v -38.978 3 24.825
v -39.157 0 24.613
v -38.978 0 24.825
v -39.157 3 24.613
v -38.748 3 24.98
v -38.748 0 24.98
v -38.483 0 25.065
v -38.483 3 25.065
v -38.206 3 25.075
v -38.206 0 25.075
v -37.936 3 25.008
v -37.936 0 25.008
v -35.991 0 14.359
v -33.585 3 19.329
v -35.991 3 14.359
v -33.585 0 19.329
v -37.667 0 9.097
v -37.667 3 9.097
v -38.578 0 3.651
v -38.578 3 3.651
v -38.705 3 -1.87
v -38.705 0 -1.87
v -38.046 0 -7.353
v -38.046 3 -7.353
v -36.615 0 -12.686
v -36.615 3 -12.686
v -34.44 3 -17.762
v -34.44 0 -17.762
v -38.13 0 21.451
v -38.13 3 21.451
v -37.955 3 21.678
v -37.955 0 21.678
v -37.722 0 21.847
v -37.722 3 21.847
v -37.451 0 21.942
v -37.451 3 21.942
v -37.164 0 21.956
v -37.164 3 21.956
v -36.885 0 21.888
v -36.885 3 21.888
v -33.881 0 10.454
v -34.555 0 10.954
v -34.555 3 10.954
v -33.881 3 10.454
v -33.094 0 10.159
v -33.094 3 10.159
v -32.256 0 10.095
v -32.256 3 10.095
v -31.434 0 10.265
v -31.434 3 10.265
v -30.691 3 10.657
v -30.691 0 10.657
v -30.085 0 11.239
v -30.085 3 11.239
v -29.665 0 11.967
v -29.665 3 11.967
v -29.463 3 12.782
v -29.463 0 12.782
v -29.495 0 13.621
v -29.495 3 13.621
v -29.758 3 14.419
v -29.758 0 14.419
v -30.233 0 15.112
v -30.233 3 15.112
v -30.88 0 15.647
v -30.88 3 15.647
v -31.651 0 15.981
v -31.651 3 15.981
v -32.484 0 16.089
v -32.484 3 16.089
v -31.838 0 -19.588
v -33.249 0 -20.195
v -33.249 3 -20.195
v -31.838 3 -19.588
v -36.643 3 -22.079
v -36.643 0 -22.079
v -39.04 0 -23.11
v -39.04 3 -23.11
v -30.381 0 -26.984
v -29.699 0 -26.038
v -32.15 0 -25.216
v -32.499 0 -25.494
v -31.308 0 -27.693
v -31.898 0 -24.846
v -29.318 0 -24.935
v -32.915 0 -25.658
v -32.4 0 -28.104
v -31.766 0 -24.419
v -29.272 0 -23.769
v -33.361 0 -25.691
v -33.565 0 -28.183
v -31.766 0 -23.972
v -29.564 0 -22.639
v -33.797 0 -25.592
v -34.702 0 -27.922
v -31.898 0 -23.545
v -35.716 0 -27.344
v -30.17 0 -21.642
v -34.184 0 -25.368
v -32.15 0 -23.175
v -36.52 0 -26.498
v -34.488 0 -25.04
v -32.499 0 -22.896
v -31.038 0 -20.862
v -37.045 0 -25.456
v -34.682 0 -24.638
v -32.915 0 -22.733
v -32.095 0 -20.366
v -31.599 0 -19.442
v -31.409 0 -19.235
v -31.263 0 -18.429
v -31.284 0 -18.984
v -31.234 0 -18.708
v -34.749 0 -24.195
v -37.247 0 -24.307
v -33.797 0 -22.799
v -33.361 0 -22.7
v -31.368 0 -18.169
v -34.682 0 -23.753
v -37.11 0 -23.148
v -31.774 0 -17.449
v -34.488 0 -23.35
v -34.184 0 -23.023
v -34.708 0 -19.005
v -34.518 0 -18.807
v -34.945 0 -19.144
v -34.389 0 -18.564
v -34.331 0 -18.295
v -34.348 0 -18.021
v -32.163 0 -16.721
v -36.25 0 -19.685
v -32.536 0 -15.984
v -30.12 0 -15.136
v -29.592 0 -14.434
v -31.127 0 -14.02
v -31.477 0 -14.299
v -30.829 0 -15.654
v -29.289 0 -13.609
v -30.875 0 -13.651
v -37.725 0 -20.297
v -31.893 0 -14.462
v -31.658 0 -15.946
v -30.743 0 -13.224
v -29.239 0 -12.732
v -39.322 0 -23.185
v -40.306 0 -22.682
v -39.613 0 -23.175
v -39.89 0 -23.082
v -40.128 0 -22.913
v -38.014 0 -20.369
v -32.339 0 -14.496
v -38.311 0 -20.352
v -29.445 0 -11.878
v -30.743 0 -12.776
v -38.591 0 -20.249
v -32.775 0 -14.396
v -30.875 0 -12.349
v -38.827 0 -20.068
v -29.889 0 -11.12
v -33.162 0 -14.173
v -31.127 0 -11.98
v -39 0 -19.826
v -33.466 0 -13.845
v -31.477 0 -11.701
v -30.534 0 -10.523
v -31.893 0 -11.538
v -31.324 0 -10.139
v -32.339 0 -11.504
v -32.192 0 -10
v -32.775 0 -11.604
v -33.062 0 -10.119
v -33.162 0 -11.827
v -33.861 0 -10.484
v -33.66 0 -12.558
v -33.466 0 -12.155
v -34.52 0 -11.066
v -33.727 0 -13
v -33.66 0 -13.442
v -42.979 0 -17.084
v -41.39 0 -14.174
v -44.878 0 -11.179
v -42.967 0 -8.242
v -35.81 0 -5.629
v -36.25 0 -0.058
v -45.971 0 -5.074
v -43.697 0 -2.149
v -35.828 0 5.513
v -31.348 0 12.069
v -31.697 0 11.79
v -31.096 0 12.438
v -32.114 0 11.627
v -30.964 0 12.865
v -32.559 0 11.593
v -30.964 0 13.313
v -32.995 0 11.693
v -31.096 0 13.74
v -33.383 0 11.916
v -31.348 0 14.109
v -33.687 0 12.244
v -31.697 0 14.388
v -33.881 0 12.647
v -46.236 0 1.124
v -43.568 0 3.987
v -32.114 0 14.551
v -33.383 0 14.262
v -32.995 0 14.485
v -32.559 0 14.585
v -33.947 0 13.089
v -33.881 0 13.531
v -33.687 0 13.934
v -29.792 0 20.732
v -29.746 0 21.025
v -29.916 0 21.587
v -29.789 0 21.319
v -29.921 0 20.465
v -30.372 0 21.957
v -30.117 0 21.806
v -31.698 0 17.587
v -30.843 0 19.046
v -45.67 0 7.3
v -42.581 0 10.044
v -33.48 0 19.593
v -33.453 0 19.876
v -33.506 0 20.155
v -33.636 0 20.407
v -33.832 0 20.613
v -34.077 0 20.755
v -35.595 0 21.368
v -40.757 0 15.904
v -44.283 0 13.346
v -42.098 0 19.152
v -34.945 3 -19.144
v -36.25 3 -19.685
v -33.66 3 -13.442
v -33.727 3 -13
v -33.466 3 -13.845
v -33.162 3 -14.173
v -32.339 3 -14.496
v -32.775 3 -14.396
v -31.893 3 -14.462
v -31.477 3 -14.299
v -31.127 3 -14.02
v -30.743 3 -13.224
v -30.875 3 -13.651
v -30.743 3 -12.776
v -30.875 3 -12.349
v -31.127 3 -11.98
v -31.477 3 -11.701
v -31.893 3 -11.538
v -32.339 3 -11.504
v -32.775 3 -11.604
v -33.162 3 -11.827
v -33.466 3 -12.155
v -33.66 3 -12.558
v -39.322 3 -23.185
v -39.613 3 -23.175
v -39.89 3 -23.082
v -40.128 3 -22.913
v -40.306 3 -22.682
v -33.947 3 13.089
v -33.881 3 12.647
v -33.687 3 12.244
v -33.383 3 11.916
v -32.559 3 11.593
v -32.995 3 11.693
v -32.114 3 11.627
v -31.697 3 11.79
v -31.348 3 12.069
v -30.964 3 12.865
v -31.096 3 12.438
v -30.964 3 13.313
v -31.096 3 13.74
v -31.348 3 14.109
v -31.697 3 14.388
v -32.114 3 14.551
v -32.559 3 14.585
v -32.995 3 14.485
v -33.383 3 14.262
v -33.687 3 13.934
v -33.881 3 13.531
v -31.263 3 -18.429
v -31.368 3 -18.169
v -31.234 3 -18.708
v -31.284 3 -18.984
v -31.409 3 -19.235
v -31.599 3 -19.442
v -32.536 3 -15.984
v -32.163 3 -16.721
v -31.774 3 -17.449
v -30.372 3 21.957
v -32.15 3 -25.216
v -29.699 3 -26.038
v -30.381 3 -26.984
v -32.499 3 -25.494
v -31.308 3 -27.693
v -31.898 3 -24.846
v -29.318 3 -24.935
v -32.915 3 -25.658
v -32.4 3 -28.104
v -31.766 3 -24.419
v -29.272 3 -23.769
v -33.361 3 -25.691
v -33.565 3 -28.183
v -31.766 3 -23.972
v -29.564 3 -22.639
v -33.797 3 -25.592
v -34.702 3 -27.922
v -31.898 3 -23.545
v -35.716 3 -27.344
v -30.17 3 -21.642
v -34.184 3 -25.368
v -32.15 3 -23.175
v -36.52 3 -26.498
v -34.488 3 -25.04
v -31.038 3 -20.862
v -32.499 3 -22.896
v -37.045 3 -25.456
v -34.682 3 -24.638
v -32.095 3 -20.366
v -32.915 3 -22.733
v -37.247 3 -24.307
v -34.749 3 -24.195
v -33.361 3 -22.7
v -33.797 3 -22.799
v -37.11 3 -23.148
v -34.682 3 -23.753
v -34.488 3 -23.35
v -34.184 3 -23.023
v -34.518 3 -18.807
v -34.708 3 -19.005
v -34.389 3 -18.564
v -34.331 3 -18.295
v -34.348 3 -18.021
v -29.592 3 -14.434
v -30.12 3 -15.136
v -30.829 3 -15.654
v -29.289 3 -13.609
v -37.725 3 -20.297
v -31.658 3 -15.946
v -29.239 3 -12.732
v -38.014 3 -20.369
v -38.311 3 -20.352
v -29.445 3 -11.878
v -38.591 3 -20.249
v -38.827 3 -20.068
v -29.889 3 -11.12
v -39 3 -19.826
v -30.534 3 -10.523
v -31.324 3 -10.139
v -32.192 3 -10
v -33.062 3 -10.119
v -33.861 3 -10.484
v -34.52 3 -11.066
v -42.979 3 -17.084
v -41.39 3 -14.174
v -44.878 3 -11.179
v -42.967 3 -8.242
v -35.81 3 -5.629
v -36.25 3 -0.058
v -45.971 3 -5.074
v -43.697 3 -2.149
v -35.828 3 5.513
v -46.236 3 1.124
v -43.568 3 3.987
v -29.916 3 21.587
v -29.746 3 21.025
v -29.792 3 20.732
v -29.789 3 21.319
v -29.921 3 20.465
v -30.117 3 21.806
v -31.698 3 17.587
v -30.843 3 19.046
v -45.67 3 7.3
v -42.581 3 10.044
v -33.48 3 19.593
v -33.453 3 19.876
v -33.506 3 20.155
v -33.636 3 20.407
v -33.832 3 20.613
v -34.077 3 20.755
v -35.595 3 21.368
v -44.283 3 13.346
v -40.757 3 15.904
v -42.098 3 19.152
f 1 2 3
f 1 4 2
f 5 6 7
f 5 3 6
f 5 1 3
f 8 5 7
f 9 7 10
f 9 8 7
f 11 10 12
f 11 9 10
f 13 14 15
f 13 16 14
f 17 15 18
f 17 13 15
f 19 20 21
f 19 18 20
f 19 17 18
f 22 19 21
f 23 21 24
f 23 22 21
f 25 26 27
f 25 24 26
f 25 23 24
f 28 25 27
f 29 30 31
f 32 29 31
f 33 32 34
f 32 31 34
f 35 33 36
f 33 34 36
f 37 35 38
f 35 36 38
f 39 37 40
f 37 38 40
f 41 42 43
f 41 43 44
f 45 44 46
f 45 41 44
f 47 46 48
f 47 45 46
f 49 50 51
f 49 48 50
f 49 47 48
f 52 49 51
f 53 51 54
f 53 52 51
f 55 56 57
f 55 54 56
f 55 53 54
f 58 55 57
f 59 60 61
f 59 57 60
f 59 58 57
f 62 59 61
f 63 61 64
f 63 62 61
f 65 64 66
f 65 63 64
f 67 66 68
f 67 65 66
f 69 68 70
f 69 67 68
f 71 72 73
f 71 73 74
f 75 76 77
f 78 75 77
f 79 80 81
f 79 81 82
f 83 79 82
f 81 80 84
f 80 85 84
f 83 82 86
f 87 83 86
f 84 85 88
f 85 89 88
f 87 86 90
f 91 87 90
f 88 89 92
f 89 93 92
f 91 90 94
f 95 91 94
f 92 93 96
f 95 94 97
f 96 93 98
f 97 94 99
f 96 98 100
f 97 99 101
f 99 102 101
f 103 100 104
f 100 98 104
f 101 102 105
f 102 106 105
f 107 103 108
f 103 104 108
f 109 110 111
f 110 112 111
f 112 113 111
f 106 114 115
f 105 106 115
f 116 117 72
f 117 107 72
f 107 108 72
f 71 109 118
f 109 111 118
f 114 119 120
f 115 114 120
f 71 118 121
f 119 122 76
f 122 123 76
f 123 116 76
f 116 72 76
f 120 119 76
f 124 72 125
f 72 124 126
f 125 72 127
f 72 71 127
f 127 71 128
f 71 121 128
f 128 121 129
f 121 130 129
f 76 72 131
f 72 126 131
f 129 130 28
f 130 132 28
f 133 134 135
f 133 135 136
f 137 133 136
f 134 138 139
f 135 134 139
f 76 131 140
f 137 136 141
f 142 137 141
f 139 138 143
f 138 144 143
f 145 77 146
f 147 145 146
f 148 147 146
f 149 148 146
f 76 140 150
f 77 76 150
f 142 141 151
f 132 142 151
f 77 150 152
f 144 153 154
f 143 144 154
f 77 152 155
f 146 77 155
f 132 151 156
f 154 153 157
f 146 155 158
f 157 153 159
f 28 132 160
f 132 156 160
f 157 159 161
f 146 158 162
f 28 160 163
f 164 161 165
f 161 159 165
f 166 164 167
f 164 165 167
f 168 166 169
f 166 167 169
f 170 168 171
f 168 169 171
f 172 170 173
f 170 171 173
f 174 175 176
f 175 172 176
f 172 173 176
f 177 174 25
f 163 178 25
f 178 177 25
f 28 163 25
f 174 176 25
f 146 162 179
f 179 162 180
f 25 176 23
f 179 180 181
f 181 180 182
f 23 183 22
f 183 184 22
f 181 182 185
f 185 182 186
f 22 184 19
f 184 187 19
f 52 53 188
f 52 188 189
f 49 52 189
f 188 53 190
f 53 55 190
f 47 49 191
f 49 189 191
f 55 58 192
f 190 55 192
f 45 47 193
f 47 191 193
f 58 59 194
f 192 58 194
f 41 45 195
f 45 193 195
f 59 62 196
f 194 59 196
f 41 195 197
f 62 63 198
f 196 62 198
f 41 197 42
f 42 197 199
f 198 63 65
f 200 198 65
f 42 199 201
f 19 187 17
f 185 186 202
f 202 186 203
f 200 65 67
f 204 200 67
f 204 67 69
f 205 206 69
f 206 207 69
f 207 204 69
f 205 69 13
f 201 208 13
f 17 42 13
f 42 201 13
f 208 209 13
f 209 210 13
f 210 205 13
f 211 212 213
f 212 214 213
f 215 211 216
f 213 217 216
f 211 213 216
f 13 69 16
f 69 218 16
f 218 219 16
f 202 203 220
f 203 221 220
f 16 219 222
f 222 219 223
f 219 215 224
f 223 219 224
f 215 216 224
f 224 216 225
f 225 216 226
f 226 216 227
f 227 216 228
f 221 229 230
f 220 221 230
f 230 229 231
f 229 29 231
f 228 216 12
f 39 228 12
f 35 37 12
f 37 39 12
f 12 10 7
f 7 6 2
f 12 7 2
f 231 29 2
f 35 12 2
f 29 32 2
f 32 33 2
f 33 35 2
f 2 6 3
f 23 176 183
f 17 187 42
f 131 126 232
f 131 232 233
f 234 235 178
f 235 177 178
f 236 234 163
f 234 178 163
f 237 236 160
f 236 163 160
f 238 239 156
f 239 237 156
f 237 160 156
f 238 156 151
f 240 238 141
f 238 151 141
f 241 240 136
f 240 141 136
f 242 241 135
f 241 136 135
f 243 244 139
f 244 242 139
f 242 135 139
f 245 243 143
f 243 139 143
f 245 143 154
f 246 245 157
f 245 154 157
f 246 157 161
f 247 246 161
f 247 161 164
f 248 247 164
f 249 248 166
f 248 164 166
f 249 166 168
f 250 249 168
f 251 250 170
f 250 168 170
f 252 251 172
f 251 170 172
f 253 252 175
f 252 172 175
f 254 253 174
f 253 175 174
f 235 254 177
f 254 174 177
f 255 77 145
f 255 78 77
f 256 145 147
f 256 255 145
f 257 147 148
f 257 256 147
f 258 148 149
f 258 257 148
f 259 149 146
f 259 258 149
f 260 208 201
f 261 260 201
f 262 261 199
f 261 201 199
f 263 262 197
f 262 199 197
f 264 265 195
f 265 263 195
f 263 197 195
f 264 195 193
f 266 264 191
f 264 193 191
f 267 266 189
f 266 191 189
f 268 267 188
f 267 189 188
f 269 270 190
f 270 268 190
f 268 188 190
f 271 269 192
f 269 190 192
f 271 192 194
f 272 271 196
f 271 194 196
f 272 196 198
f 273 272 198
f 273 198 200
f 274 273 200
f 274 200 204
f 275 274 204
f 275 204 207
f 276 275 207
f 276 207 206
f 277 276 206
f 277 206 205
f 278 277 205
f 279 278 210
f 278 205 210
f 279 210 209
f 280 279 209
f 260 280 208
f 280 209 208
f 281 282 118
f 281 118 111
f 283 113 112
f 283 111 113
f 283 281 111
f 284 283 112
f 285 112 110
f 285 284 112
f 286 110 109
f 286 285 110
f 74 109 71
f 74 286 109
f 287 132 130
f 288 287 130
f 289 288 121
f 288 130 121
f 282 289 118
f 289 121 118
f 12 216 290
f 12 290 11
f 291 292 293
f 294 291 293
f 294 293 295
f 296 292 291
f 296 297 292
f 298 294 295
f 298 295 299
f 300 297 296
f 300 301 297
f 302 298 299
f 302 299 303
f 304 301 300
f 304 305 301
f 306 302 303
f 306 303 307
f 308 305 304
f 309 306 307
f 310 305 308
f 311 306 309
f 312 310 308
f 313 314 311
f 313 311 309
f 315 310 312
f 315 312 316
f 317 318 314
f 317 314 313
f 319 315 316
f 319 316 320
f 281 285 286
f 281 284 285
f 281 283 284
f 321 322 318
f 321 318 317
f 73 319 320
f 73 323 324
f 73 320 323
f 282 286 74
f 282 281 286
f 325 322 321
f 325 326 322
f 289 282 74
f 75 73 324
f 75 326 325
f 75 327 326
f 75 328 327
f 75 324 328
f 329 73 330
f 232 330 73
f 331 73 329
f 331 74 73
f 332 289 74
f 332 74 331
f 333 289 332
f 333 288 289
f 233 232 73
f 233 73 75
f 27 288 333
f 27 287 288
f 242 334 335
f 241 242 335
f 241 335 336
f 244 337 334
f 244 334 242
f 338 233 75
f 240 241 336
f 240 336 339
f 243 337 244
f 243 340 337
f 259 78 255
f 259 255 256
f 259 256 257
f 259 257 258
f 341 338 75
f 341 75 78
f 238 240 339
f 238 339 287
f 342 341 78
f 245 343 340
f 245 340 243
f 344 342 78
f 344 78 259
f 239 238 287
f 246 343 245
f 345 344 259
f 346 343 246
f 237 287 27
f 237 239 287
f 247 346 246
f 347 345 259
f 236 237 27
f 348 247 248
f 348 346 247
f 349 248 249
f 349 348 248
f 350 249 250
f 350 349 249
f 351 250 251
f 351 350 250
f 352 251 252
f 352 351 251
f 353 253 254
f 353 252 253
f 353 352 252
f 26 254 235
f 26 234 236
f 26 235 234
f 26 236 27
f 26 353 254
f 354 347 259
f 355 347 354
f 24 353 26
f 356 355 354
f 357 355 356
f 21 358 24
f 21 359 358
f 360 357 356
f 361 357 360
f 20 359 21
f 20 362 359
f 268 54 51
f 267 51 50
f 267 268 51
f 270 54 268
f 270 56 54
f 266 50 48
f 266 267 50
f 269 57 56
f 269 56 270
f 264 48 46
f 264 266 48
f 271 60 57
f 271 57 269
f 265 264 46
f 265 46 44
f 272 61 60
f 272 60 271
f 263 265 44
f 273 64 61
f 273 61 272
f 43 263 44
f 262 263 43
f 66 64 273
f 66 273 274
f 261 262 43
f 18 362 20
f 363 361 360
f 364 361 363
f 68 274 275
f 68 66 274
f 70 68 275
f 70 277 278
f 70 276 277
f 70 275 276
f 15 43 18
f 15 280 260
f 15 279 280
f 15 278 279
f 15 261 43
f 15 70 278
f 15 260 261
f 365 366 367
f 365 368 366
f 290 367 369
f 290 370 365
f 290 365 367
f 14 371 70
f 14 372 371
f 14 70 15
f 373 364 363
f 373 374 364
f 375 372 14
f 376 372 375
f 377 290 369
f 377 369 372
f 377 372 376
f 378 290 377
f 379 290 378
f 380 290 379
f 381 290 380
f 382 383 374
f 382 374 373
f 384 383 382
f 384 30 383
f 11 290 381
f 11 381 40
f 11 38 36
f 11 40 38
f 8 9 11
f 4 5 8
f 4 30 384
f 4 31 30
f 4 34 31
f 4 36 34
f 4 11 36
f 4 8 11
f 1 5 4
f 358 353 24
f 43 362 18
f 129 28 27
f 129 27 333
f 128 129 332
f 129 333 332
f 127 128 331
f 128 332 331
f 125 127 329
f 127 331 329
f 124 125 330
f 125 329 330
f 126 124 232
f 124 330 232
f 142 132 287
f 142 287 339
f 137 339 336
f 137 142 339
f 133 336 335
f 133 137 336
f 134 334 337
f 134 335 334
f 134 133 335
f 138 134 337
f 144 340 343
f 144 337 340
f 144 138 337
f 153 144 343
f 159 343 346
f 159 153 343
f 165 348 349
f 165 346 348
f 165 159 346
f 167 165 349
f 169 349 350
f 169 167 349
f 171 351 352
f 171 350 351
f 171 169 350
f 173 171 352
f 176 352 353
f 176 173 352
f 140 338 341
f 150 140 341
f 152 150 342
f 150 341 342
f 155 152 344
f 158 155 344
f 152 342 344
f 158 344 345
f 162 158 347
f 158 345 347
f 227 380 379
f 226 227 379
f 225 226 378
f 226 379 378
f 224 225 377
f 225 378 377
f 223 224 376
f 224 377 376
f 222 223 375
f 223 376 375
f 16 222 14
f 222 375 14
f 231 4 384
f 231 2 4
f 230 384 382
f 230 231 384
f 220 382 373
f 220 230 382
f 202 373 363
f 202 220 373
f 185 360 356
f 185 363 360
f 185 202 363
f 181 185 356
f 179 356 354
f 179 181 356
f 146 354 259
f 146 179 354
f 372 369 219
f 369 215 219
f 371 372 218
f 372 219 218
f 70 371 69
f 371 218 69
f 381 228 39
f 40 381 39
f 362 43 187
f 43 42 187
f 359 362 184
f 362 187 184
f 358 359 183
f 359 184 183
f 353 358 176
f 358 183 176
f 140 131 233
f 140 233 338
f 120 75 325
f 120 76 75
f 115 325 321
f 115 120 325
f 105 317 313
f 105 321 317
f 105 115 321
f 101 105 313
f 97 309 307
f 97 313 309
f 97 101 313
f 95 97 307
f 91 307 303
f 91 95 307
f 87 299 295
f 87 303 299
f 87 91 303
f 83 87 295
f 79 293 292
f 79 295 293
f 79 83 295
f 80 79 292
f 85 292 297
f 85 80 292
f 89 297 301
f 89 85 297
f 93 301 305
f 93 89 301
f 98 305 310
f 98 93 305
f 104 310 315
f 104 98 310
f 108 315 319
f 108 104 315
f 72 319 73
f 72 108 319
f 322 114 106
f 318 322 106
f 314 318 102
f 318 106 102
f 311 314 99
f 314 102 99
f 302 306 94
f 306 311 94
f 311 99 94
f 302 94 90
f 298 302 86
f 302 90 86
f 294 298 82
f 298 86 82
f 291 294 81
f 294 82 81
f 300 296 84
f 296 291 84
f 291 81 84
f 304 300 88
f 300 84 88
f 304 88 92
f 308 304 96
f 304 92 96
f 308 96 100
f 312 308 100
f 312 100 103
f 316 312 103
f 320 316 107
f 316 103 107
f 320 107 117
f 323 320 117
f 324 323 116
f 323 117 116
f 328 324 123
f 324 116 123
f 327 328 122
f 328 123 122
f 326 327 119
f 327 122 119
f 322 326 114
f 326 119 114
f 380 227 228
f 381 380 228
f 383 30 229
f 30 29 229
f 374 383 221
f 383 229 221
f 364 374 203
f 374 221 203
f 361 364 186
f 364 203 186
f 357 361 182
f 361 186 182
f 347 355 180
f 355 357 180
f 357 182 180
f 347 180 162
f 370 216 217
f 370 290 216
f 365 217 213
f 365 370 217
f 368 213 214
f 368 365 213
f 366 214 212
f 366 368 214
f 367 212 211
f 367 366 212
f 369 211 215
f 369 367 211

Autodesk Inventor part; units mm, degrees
ref_plane "YZ Plane" through (0, 0, 0) normal (1, 0, 0) x (0, 1, 0)
ref_plane "XZ Plane" through (0, 0, 0) normal (0, 1, 0) x (-1, 0, 0)
ref_plane "XY Plane" through (0, 0, 0) normal (0, 0, 1) x (1, 0, 0)
sketch "Sketch1" plane through (0, 0, 0) normal (0, 1, 0) x (-1, 0, 0)
  circle A0 centre (32.4474, 13.089) radius 1.5
  circle A1 centre (32.2267, -13) radius 1.5
  arc A2 (39.8573, -23.4618) -> (38.7049, 25.3179) centre (0, 0) ccw
  line L0 (32.9955, 20.319) -> (35.5948, 21.3676)
  line L1 (29.1983, 21.483) -> (38.7049, 25.3179)
  circle A3 centre (33.2491, -24.1954) radius 1.5
  line L2 (36.25, -19.685) -> (38.5713, -20.6475)
  line L3 (35.5948, 21.3676) -> (37.6913, 22.2133)
  line L4 (33.9272, -18.7219) -> (36.25, -19.685)
  arc A4 (33.9272, -18.7219) -> (32.9955, 20.319) centre (0, 0) ccw
  arc A5 (38.5713, -20.6475) -> (37.6913, 22.2133) centre (0, 0) ccw
  arc A6 (32.4841, 16.0888) -> (29.1983, 21.483) centre (0, 0) ccw
  arc A7 (30.7875, -19.1361) -> (32.5357, -15.984) centre (0, 0) ccw
  arc A8 (34.5198, -11.0656) -> (34.5553, 10.9543) centre (0, 0) ccw
  arc A9 (32.4841, 16.0888) -> (34.5553, 10.9543) centre (32.4474, 13.089) ccw
  arc A10 (34.5198, -11.0656) -> (32.5357, -15.984) centre (32.2267, -13) ccw
  line L5 (33.2491, -20.1954) -> (30.7875, -19.1361)
  line L6 (36.643, -22.0786) -> (39.8573, -23.4618)
  arc A11 (33.2491, -20.1954) -> (36.643, -22.0786) centre (33.2491, -24.1954) ccw
  dimension "d29" = 4
  dimension "d30" = 3
  dimension "d31" = 3
  dimension "d32" = 46.25
  dimension "d33" = 43.75
  dimension "d34" = 38.75
  dimension "d35" = 36.25
  dimension "d36" = 36.25
  dimension "d37" = 0.764
  dimension "d38" = 45.253
  dimension "d39" = 0.764
  dimension "d40" = 0.3882
  dimension "d41" = 2.5
  dimension "d42" = 2.1071
  dimension "d43" = 43.1688
  dimension "d44" = 44.3514
  dimension "d45" = 2.0605
  dimension "d46" = 2.0432
  dimension "d47" = 39.4934
  dimension "d48" = 29.5173
  dimension "d49" = 9.2767
  dimension "d50" = 1.6208
  dimension "d51" = 33.4149
  dimension "d52" = 5.7959
  dimension "d53" = 4.2998
  dimension "d54" = 26.089
extrude "Extrusion1" add sketch "Sketch1" along normal blind 3
fillet "Fillet1" radius 1 8 edges at (-29.1983, 1.5, 21.483) (-38.7049, 1.5, 25.3179) (-38.5713, 1.5, -20.6475) (-30.7875, 1.5, -19.1361) (-33.9272, 1.5, -18.7219) (-39.8573, 1.5, -23.4618) (-32.9955, 1.5, 20.319) (-37.6913, 1.5, 22.2133)
properties part number "reverse gear reverse gear"
